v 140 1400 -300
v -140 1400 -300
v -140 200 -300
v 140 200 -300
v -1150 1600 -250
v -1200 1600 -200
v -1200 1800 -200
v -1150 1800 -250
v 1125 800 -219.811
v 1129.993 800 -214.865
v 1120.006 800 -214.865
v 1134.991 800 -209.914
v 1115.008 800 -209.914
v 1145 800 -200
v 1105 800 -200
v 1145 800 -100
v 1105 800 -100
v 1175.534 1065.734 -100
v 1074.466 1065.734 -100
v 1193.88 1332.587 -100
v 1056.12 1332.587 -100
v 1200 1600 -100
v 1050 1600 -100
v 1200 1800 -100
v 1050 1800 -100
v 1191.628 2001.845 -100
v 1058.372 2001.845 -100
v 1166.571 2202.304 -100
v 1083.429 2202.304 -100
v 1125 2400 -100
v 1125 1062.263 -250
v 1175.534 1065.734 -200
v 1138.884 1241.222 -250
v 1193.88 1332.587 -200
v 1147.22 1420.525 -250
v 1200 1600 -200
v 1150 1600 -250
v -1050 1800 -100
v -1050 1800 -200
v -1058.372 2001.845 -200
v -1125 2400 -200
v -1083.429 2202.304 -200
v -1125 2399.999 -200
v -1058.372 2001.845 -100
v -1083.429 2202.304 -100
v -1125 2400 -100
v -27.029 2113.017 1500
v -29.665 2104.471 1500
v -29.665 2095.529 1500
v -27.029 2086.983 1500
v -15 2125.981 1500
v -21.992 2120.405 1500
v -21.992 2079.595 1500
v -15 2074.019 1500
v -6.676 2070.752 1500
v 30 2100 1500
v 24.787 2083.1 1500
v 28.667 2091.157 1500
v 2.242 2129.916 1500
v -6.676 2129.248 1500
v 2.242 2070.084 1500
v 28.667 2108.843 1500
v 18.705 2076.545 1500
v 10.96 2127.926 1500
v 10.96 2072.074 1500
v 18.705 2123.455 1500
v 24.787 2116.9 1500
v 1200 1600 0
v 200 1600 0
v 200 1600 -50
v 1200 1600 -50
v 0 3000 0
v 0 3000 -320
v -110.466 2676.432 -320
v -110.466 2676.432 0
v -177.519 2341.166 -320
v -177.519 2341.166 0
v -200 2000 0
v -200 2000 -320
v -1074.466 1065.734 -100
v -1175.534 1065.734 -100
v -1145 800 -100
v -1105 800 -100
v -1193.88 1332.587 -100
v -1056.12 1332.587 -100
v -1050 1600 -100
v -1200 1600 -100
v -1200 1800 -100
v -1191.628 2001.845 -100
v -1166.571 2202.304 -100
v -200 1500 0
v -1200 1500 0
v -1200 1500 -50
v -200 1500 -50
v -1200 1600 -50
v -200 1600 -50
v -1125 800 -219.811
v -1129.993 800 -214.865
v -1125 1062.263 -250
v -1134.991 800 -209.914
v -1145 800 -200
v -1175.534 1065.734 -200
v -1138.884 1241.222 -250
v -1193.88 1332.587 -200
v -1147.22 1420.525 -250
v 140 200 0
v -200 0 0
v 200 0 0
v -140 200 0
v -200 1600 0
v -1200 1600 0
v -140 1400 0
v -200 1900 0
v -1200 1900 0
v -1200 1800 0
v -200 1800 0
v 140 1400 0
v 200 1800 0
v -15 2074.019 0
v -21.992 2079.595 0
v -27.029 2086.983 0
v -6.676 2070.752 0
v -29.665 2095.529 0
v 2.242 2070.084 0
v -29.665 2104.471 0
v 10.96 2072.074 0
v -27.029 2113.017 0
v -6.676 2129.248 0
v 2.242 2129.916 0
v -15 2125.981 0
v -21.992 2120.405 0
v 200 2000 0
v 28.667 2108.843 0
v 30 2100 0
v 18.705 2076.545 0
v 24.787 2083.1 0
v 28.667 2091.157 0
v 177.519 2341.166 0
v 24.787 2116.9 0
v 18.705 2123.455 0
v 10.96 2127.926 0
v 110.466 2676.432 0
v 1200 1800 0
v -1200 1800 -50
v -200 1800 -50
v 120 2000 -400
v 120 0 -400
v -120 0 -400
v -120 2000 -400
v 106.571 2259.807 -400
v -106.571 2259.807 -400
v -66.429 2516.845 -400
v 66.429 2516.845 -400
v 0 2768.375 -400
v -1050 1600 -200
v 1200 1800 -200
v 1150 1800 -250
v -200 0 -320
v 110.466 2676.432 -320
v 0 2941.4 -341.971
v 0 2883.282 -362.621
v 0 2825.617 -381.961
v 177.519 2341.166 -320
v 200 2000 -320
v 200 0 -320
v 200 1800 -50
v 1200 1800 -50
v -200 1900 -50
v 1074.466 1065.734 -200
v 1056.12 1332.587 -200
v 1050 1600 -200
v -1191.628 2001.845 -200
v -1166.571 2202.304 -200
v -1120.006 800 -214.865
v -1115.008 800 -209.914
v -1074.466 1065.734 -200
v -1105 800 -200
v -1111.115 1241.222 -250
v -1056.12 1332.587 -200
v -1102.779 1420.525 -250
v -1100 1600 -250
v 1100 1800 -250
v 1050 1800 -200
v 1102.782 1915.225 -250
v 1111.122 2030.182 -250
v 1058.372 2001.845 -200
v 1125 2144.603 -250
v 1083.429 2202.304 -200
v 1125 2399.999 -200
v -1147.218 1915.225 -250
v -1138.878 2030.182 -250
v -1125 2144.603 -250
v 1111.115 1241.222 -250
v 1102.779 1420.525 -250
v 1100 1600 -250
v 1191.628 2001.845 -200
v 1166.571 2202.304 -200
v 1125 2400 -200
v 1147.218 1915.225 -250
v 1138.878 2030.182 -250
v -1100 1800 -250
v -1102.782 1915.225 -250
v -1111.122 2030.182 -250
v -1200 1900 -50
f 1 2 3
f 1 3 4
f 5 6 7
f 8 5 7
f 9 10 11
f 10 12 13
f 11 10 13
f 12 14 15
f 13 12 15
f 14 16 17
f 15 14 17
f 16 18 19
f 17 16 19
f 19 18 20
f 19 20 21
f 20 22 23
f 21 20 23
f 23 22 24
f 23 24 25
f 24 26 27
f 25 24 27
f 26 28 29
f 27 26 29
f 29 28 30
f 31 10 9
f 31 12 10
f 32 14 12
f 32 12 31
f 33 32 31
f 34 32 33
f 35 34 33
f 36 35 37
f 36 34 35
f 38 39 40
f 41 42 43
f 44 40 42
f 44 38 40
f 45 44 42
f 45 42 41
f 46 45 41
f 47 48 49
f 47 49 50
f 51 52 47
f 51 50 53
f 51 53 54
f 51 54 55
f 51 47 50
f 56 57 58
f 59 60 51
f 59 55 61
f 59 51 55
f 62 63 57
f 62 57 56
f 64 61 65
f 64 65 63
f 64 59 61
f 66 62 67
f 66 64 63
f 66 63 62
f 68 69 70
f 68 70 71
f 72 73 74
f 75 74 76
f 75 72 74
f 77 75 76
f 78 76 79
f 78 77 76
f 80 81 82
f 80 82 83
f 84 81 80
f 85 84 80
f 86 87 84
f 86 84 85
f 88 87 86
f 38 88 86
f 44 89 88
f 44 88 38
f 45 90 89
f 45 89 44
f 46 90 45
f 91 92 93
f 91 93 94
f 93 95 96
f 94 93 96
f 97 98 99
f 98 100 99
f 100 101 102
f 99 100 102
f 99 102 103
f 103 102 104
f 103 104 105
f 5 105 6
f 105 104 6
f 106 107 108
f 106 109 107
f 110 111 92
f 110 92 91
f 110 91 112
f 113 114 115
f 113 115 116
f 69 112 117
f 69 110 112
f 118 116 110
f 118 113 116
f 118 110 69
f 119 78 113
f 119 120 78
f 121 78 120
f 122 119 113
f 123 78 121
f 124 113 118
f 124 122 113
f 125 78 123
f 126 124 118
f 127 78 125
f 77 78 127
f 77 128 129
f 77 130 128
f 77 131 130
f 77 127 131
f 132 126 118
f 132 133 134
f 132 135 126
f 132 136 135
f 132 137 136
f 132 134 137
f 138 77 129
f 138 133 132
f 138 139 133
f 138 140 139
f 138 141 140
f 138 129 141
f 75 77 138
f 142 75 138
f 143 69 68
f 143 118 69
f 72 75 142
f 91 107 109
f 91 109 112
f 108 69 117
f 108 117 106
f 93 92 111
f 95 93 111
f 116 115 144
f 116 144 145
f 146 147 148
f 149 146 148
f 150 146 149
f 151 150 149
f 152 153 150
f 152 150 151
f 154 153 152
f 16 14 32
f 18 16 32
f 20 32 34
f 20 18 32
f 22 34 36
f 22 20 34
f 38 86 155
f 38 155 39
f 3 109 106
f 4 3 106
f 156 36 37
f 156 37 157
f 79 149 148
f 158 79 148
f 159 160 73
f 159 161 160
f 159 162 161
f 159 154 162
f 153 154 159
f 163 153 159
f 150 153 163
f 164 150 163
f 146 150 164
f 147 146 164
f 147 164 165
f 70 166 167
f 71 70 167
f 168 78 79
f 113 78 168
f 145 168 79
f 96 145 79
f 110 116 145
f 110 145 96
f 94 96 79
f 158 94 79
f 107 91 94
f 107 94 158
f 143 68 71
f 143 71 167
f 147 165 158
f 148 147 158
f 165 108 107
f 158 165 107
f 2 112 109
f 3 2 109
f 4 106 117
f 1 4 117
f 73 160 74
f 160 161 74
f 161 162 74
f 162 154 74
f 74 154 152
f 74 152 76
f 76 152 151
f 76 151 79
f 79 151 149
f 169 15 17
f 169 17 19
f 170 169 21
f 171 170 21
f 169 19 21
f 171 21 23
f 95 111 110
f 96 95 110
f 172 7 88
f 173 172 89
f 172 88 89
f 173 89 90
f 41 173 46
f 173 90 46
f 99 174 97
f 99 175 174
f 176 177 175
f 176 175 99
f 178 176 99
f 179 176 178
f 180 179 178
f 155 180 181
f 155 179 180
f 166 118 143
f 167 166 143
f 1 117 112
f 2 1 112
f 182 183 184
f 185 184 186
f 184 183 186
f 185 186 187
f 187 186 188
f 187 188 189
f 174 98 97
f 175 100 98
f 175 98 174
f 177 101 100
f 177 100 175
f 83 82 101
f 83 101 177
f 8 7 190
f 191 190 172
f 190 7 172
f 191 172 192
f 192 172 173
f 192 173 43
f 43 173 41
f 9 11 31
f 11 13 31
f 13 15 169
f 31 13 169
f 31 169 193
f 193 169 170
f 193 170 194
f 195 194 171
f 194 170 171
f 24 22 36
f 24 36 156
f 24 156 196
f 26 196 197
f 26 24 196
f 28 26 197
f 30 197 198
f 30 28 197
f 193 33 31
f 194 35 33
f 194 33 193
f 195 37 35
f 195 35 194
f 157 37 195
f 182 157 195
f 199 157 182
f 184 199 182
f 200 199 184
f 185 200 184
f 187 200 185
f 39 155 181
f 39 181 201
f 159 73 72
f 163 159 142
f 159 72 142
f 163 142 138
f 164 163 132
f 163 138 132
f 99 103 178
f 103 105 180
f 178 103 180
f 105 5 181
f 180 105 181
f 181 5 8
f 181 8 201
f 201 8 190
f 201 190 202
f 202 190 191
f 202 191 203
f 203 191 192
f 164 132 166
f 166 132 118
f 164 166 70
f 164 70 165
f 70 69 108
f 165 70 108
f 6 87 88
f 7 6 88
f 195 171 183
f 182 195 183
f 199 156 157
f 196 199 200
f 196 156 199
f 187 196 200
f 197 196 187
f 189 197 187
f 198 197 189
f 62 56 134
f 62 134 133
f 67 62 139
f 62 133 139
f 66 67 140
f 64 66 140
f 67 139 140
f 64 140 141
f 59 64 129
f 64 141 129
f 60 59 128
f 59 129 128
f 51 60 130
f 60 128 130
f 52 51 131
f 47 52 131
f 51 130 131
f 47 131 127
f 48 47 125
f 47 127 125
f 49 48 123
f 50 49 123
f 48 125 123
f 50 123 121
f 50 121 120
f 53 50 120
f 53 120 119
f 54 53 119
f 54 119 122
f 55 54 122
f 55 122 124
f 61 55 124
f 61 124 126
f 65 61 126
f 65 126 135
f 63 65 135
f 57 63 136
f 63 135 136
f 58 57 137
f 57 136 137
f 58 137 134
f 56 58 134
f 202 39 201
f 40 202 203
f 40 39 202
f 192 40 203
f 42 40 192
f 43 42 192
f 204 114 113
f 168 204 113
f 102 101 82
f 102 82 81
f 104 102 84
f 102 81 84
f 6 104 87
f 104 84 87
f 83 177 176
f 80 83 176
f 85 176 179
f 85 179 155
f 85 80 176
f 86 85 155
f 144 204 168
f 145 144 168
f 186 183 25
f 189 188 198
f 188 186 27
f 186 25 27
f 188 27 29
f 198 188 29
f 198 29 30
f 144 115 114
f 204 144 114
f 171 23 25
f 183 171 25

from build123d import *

# Parameters (mm, degrees)
F1_DEPTH    = 400
F3_W        = 1200
F3_H        = 100
F4_DEPTH    = 50
F5_W        = 1000
F5_H        = 200
F6_DEPTH    = 50
F8_START    = -100
F8_DEPTH    = 150
F11_SIZE    = 80
F13_DEPTH   = 300
F14_R       = 30
F15_DEPTH   = 1500
F16_C1_SIZE = 50
F16_C2_SIZE = 49.9996
F17_C1_SIZE = 50
F17_C2_SIZE = 49.9996


# Not quite as in the source:
# - a fillet or chamfer is up to 0.001 mm smaller than in the source, because OpenCascade refuses the exact size


with BuildPart() as f1:
    # F0 (on Top) → F1 (new body)
    with BuildSketch(Plane.XY):
        with BuildLine():
            Line((-200, 0), (0, 0))
            Line((0, 0), (0, 3000))
            ThreePointArc((0, 3000), (-149.5097567964, 2509.9019513593), (-200, 2000))
            Line((-200, 2000), (-200, 0))
        make_face()
    extrude(amount=-F1_DEPTH)

    # F2: F1 across face


with BuildPart() as f1_1:
    add(f1.part)
    add(f1.part.mirror(Plane(origin=(0, 1500, -200), x_dir=(0, 1, 0), z_dir=(1, 0, 0))))

    # F3 (on Top) → F4 (join)
    with BuildSketch(Plane.XY):
        with Locations((-600, 1550)):
            Rectangle(F3_W, F3_H)
        with Locations((-600, 1850)):
            Rectangle(F3_W, F3_H)
    extrude(amount=-F4_DEPTH)

    # F5 (on face) → F6 (join)
    with BuildSketch(Plane.XY):
        with Locations((700, 1700)):
            Rectangle(F5_W, F5_H)
    extrude(amount=-F6_DEPTH)

    # F11
    f11_edges = [f1_1.edges().sort_by_distance(p)[0] for p in [
        (-200, 1000, -400),
        (-149.509757, 2509.901951, -400),
        (149.509757, 2509.901951, -400),
        (200, 1000, -400),
    ]]
    chamfer(f11_edges, length=F11_SIZE)

    # F12 (on face) → F13 (cut)
    with BuildSketch(Plane.XY):
        Polygon((140, 200), (140, 1400), (0, 1400), (-140, 1400), (-140, 200), (0, 200), align=None)
    extrude(amount=-F13_DEPTH, mode=Mode.SUBTRACT)

    # F14 (on face) → F15 (join)
    with BuildSketch(Plane.XY):
        with Locations((0, 2100)):
            Circle(F14_R)
    extrude(amount=F15_DEPTH)


with BuildPart() as f8:
    # F7 (on Top) → F8 (new body)
    with BuildSketch(Plane.XY.offset(F8_START)):
        with BuildLine():
            Line((1200, 1600), (1200, 1800))
            ThreePointArc((1200, 1800), (1181.1773244896, 2102.3346655612), (1125, 2400))
            Line((1125, 2400), (1125, 800))
            Line((1125, 800), (1145, 800))
            ThreePointArc((1145, 800), (1186.2337907259, 1199.0558018876), (1200, 1600))
        make_face()
    extrude(amount=-F8_DEPTH)

    # F9: F8 across face


with BuildPart() as f8_1:
    add(f8.part)
    add(f8.part.mirror(Plane(origin=(1125, 1600, -175), x_dir=(0, -1, 0), z_dir=(-1, 0, 0))))


with BuildPart() as f10_1:
    # F10: instance of F8
    add(f8_1.part.mirror(Plane.YZ))

    # F17: chamfer of 50 on 2 edges, made by hand

    # F17_c1
    f17_c1_edges = [f10_1.edges().sort_by_distance(p)[0] for p in [
        (-1200, 1700, -250),
        (-1181.1773244896, 2102.3346655612, -250),
        (-1186.2337907259, 1199.0558018876, -250),
    ]]
    chamfer(f17_c1_edges, length=F17_C1_SIZE)

    # F17_c2 (size 50 in the source; OpenCascade refuses exactly that, so slightly less here)
    f17_c2_edges = [f10_1.edges().sort_by_distance(p)[0] for p in [
        (-1062.3992616244, 2045.5456347202, -250),
        (-1050, 1700, -250),
        (-1062.4591242566, 1218.5436820583, -250),
    ]]
    chamfer(f17_c2_edges, length=F17_C2_SIZE)


with BuildPart() as f8_2:
    add(f8_1.part)

    # F16: chamfer of 50 on 2 edges, made by hand

    # F16_c1
    f16_c1_edges = [f8_2.edges().sort_by_distance(p)[0] for p in [
        (1200, 1700, -250),
        (1181.1773244896, 2102.3346655612, -250),
        (1186.2337907259, 1199.0558018876, -250),
    ]]
    chamfer(f16_c1_edges, length=F16_C1_SIZE)

    # F16_c2 (size 50 in the source; OpenCascade refuses exactly that, so slightly less here)
    f16_c2_edges = [f8_2.edges().sort_by_distance(p)[0] for p in [
        (1062.3992616244, 2045.5456347202, -250),
        (1050, 1700, -250),
        (1062.4591242566, 1218.5436820583, -250),
    ]]
    chamfer(f16_c2_edges, length=F16_C2_SIZE)


solid = Compound([f1_1.part, f10_1.part, f8_2.part])
